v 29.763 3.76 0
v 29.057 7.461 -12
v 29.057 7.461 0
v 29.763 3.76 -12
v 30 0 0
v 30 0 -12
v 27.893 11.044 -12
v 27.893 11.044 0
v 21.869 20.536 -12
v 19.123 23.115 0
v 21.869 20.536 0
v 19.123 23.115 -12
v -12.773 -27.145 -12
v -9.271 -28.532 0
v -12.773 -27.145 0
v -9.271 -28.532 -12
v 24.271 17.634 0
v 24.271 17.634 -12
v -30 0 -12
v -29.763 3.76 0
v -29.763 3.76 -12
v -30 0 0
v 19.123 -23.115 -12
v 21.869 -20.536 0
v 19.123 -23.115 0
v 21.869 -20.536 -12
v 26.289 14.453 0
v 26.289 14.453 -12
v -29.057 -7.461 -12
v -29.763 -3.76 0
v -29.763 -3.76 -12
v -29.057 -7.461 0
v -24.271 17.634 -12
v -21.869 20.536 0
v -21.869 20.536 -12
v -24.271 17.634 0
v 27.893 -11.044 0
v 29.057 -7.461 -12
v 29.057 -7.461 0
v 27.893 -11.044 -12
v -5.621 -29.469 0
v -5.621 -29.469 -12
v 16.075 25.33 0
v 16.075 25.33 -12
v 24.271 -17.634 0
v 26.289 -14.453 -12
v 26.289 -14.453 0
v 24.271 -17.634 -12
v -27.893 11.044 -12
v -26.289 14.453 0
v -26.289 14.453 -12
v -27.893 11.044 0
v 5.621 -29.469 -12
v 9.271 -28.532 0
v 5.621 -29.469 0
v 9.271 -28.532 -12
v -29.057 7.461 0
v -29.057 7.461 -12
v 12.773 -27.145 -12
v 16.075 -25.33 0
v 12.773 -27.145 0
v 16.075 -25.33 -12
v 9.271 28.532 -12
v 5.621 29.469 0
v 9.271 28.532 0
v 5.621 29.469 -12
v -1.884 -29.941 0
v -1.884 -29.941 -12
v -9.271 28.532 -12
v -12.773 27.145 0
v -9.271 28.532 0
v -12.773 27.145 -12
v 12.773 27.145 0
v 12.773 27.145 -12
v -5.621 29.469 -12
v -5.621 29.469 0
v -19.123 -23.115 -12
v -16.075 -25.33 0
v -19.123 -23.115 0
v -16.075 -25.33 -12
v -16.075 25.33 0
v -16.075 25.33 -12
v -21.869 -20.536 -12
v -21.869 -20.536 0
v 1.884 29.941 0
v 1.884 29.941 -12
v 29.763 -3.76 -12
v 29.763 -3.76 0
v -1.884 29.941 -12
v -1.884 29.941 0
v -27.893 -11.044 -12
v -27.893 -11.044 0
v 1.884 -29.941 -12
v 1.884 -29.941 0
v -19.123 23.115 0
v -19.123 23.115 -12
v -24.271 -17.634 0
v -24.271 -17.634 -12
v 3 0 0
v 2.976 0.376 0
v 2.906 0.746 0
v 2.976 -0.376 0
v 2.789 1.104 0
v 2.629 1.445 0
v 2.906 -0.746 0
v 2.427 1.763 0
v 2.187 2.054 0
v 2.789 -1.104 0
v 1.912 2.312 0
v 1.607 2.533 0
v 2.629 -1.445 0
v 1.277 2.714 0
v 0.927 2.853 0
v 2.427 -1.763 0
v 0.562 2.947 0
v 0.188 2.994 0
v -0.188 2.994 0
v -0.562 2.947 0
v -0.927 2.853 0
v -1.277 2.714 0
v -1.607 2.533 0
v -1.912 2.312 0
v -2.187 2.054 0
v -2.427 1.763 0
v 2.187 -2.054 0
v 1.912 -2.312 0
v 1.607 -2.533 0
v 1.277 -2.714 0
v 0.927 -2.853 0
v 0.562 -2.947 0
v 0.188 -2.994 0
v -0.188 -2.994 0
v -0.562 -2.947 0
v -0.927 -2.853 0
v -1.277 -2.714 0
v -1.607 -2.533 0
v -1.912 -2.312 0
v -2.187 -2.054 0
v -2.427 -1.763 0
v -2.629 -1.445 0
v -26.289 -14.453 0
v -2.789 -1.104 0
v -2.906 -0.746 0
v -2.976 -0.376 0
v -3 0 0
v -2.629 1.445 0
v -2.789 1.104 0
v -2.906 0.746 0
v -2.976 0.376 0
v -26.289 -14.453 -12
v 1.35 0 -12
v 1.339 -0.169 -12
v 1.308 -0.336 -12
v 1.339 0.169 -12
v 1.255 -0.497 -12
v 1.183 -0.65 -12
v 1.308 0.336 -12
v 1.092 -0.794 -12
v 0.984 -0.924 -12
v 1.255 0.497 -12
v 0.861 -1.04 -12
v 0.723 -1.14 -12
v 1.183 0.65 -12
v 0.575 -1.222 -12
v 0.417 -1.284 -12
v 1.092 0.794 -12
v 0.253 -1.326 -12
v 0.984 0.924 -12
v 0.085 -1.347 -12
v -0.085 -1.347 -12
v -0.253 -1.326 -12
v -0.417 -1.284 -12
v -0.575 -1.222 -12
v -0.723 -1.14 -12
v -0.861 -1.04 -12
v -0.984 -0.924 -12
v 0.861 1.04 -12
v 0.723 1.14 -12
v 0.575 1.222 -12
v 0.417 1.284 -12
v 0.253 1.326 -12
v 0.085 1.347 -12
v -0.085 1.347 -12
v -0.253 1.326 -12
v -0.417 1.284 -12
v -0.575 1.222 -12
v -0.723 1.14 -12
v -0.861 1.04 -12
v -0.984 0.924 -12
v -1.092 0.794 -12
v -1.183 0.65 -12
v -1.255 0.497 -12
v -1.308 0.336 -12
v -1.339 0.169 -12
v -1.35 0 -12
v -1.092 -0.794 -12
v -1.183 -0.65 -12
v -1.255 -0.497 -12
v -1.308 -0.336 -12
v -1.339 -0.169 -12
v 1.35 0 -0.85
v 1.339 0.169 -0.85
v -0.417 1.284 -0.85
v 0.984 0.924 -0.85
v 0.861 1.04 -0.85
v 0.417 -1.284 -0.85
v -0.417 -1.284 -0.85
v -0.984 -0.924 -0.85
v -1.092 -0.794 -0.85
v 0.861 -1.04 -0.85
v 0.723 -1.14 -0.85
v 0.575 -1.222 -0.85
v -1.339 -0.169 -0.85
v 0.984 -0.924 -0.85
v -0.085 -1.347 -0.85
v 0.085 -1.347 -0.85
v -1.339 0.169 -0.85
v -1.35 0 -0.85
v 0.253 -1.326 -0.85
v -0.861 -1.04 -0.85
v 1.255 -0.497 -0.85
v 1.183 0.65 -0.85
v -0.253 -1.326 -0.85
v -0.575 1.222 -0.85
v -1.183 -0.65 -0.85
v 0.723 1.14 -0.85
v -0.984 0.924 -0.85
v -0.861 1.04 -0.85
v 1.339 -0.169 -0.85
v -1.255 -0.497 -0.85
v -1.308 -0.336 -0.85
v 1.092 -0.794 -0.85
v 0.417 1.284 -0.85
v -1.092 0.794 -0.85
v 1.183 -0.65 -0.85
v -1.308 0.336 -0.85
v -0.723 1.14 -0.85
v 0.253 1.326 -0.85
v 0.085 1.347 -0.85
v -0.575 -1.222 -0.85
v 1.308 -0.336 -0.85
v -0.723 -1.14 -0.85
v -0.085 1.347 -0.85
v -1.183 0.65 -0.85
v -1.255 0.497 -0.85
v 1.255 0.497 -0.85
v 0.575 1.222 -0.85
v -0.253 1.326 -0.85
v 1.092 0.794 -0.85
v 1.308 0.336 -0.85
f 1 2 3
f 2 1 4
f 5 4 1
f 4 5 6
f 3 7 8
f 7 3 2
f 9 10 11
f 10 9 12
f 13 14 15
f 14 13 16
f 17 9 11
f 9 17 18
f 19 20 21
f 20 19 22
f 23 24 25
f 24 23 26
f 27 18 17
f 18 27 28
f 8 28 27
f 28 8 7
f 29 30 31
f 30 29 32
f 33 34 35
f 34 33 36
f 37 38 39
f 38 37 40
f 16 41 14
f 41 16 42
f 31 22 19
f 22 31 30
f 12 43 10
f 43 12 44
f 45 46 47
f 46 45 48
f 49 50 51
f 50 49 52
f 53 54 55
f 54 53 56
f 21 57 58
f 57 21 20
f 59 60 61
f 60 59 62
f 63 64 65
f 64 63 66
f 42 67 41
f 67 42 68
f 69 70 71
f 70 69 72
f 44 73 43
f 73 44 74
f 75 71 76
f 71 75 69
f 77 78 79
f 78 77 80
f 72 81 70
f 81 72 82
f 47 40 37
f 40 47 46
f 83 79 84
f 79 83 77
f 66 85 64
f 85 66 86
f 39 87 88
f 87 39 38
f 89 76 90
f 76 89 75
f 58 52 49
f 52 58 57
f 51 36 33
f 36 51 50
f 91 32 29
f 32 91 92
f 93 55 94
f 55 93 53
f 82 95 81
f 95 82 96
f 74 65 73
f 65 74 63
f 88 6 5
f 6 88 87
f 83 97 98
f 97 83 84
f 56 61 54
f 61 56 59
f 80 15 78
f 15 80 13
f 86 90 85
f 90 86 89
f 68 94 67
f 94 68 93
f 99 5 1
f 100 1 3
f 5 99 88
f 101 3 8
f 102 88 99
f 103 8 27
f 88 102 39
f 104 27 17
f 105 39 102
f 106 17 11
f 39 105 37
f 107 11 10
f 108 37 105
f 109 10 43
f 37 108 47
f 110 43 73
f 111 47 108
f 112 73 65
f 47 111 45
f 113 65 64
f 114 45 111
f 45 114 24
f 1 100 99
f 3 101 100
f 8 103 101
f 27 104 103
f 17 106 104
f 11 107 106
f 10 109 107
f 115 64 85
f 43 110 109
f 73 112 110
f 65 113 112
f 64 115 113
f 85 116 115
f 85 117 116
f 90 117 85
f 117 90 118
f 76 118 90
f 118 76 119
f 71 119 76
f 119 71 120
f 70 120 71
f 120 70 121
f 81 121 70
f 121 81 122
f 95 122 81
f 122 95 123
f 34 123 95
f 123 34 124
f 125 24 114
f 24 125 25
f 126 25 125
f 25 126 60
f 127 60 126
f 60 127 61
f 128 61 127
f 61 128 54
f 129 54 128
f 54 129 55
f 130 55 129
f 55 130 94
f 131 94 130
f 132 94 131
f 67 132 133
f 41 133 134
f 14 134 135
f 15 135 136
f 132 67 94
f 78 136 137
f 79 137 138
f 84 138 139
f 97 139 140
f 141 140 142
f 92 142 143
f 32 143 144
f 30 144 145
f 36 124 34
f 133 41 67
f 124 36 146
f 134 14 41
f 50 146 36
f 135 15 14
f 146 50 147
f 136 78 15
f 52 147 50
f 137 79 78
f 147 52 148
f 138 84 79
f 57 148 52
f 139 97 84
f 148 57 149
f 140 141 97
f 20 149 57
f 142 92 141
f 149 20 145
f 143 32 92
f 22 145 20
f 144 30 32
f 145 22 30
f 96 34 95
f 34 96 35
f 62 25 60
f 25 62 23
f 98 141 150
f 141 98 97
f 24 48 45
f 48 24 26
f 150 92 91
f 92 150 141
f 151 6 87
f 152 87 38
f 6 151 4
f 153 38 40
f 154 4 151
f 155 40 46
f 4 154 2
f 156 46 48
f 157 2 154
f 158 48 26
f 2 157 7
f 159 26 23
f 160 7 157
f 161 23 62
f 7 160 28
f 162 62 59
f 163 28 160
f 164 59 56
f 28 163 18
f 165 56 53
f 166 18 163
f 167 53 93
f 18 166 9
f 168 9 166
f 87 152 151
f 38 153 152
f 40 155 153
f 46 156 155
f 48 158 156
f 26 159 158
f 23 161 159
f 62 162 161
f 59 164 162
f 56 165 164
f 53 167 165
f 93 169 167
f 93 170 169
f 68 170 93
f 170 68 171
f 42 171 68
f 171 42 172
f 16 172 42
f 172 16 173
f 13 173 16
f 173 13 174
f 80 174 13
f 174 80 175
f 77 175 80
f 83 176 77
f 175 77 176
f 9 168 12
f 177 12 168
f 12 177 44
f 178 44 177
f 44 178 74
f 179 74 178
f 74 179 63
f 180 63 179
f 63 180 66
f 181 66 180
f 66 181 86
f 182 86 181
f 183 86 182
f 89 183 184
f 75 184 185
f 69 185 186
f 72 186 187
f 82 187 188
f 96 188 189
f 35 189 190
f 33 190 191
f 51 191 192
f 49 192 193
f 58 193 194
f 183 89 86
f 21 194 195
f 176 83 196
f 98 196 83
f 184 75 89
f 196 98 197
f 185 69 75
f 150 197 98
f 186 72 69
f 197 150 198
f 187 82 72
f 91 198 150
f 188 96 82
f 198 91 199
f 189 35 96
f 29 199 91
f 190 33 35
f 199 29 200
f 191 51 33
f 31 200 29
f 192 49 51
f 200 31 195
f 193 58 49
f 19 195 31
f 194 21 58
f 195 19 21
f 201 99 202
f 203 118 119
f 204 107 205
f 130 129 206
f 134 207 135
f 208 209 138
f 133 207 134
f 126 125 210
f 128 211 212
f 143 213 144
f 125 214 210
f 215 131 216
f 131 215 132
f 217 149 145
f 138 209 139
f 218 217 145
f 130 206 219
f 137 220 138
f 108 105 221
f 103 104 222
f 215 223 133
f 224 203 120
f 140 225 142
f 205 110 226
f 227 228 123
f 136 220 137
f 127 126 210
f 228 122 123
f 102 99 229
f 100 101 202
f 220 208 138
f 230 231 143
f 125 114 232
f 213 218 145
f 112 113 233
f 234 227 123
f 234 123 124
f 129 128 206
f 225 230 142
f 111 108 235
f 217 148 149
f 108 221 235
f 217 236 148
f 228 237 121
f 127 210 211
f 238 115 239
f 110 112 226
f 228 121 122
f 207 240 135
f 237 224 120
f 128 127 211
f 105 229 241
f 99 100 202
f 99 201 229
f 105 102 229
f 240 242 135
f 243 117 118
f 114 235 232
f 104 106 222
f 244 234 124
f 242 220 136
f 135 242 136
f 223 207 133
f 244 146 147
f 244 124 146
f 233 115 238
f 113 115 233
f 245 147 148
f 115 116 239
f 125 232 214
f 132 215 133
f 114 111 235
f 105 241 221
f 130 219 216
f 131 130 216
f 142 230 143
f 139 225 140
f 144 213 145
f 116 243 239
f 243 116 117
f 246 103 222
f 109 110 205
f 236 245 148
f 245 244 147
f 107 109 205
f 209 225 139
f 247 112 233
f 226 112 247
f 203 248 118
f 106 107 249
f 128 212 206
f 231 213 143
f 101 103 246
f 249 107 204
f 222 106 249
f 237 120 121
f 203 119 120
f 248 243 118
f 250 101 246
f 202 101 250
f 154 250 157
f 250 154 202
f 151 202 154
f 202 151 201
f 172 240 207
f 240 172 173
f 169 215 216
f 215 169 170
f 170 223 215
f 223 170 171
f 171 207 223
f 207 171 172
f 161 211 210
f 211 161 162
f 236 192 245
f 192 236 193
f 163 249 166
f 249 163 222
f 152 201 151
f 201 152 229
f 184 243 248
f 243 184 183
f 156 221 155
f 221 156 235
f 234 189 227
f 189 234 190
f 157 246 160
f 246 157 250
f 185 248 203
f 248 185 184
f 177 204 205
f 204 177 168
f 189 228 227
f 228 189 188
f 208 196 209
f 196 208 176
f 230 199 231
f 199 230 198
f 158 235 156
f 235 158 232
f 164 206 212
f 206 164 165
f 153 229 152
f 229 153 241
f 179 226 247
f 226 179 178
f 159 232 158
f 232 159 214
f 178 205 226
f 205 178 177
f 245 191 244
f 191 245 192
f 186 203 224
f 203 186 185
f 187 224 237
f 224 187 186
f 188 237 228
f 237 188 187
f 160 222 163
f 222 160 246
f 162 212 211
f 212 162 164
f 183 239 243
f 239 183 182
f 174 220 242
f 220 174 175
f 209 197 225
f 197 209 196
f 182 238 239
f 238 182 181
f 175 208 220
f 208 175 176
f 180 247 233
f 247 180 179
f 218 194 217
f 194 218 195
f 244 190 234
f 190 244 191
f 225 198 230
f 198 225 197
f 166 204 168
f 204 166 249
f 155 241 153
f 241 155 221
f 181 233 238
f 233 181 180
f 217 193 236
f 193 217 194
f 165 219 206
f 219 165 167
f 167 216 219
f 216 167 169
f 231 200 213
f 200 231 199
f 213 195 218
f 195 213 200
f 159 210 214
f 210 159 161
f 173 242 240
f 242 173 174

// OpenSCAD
$fn = 50;


difference() {
	union() {
		translate(v = [0, 0, -12.0000000000]) {
			cylinder(h = 12, r = 30.0000000000);
		}
		translate(v = [0, 0, -12.0000000000]) {
			cylinder(h = 12, r = 2.8750000000);
		}
	}
	union() {
		translate(v = [0, 0, 0]) {
			rotate(a = [0, 0, 0]) {
				difference() {
					union() {
						translate(v = [0, 0, -12.0000000000]) {
							cylinder(h = 12, r = 1.0000000000);
						}
						translate(v = [0, 0, -0.8500000000]) {
							cylinder(h = 0.8500000000, r1 = 1.3500000000, r2 = 3.0000000000);
						}
						translate(v = [0, 0, -12.0000000000]) {
							cylinder(h = 12, r = 1.3500000000);
						}
						translate(v = [0, 0, -12.0000000000]) {
							cylinder(h = 12, r = 1.0000000000);
						}
					}
					union();
				}
			}
		}
	}
}
